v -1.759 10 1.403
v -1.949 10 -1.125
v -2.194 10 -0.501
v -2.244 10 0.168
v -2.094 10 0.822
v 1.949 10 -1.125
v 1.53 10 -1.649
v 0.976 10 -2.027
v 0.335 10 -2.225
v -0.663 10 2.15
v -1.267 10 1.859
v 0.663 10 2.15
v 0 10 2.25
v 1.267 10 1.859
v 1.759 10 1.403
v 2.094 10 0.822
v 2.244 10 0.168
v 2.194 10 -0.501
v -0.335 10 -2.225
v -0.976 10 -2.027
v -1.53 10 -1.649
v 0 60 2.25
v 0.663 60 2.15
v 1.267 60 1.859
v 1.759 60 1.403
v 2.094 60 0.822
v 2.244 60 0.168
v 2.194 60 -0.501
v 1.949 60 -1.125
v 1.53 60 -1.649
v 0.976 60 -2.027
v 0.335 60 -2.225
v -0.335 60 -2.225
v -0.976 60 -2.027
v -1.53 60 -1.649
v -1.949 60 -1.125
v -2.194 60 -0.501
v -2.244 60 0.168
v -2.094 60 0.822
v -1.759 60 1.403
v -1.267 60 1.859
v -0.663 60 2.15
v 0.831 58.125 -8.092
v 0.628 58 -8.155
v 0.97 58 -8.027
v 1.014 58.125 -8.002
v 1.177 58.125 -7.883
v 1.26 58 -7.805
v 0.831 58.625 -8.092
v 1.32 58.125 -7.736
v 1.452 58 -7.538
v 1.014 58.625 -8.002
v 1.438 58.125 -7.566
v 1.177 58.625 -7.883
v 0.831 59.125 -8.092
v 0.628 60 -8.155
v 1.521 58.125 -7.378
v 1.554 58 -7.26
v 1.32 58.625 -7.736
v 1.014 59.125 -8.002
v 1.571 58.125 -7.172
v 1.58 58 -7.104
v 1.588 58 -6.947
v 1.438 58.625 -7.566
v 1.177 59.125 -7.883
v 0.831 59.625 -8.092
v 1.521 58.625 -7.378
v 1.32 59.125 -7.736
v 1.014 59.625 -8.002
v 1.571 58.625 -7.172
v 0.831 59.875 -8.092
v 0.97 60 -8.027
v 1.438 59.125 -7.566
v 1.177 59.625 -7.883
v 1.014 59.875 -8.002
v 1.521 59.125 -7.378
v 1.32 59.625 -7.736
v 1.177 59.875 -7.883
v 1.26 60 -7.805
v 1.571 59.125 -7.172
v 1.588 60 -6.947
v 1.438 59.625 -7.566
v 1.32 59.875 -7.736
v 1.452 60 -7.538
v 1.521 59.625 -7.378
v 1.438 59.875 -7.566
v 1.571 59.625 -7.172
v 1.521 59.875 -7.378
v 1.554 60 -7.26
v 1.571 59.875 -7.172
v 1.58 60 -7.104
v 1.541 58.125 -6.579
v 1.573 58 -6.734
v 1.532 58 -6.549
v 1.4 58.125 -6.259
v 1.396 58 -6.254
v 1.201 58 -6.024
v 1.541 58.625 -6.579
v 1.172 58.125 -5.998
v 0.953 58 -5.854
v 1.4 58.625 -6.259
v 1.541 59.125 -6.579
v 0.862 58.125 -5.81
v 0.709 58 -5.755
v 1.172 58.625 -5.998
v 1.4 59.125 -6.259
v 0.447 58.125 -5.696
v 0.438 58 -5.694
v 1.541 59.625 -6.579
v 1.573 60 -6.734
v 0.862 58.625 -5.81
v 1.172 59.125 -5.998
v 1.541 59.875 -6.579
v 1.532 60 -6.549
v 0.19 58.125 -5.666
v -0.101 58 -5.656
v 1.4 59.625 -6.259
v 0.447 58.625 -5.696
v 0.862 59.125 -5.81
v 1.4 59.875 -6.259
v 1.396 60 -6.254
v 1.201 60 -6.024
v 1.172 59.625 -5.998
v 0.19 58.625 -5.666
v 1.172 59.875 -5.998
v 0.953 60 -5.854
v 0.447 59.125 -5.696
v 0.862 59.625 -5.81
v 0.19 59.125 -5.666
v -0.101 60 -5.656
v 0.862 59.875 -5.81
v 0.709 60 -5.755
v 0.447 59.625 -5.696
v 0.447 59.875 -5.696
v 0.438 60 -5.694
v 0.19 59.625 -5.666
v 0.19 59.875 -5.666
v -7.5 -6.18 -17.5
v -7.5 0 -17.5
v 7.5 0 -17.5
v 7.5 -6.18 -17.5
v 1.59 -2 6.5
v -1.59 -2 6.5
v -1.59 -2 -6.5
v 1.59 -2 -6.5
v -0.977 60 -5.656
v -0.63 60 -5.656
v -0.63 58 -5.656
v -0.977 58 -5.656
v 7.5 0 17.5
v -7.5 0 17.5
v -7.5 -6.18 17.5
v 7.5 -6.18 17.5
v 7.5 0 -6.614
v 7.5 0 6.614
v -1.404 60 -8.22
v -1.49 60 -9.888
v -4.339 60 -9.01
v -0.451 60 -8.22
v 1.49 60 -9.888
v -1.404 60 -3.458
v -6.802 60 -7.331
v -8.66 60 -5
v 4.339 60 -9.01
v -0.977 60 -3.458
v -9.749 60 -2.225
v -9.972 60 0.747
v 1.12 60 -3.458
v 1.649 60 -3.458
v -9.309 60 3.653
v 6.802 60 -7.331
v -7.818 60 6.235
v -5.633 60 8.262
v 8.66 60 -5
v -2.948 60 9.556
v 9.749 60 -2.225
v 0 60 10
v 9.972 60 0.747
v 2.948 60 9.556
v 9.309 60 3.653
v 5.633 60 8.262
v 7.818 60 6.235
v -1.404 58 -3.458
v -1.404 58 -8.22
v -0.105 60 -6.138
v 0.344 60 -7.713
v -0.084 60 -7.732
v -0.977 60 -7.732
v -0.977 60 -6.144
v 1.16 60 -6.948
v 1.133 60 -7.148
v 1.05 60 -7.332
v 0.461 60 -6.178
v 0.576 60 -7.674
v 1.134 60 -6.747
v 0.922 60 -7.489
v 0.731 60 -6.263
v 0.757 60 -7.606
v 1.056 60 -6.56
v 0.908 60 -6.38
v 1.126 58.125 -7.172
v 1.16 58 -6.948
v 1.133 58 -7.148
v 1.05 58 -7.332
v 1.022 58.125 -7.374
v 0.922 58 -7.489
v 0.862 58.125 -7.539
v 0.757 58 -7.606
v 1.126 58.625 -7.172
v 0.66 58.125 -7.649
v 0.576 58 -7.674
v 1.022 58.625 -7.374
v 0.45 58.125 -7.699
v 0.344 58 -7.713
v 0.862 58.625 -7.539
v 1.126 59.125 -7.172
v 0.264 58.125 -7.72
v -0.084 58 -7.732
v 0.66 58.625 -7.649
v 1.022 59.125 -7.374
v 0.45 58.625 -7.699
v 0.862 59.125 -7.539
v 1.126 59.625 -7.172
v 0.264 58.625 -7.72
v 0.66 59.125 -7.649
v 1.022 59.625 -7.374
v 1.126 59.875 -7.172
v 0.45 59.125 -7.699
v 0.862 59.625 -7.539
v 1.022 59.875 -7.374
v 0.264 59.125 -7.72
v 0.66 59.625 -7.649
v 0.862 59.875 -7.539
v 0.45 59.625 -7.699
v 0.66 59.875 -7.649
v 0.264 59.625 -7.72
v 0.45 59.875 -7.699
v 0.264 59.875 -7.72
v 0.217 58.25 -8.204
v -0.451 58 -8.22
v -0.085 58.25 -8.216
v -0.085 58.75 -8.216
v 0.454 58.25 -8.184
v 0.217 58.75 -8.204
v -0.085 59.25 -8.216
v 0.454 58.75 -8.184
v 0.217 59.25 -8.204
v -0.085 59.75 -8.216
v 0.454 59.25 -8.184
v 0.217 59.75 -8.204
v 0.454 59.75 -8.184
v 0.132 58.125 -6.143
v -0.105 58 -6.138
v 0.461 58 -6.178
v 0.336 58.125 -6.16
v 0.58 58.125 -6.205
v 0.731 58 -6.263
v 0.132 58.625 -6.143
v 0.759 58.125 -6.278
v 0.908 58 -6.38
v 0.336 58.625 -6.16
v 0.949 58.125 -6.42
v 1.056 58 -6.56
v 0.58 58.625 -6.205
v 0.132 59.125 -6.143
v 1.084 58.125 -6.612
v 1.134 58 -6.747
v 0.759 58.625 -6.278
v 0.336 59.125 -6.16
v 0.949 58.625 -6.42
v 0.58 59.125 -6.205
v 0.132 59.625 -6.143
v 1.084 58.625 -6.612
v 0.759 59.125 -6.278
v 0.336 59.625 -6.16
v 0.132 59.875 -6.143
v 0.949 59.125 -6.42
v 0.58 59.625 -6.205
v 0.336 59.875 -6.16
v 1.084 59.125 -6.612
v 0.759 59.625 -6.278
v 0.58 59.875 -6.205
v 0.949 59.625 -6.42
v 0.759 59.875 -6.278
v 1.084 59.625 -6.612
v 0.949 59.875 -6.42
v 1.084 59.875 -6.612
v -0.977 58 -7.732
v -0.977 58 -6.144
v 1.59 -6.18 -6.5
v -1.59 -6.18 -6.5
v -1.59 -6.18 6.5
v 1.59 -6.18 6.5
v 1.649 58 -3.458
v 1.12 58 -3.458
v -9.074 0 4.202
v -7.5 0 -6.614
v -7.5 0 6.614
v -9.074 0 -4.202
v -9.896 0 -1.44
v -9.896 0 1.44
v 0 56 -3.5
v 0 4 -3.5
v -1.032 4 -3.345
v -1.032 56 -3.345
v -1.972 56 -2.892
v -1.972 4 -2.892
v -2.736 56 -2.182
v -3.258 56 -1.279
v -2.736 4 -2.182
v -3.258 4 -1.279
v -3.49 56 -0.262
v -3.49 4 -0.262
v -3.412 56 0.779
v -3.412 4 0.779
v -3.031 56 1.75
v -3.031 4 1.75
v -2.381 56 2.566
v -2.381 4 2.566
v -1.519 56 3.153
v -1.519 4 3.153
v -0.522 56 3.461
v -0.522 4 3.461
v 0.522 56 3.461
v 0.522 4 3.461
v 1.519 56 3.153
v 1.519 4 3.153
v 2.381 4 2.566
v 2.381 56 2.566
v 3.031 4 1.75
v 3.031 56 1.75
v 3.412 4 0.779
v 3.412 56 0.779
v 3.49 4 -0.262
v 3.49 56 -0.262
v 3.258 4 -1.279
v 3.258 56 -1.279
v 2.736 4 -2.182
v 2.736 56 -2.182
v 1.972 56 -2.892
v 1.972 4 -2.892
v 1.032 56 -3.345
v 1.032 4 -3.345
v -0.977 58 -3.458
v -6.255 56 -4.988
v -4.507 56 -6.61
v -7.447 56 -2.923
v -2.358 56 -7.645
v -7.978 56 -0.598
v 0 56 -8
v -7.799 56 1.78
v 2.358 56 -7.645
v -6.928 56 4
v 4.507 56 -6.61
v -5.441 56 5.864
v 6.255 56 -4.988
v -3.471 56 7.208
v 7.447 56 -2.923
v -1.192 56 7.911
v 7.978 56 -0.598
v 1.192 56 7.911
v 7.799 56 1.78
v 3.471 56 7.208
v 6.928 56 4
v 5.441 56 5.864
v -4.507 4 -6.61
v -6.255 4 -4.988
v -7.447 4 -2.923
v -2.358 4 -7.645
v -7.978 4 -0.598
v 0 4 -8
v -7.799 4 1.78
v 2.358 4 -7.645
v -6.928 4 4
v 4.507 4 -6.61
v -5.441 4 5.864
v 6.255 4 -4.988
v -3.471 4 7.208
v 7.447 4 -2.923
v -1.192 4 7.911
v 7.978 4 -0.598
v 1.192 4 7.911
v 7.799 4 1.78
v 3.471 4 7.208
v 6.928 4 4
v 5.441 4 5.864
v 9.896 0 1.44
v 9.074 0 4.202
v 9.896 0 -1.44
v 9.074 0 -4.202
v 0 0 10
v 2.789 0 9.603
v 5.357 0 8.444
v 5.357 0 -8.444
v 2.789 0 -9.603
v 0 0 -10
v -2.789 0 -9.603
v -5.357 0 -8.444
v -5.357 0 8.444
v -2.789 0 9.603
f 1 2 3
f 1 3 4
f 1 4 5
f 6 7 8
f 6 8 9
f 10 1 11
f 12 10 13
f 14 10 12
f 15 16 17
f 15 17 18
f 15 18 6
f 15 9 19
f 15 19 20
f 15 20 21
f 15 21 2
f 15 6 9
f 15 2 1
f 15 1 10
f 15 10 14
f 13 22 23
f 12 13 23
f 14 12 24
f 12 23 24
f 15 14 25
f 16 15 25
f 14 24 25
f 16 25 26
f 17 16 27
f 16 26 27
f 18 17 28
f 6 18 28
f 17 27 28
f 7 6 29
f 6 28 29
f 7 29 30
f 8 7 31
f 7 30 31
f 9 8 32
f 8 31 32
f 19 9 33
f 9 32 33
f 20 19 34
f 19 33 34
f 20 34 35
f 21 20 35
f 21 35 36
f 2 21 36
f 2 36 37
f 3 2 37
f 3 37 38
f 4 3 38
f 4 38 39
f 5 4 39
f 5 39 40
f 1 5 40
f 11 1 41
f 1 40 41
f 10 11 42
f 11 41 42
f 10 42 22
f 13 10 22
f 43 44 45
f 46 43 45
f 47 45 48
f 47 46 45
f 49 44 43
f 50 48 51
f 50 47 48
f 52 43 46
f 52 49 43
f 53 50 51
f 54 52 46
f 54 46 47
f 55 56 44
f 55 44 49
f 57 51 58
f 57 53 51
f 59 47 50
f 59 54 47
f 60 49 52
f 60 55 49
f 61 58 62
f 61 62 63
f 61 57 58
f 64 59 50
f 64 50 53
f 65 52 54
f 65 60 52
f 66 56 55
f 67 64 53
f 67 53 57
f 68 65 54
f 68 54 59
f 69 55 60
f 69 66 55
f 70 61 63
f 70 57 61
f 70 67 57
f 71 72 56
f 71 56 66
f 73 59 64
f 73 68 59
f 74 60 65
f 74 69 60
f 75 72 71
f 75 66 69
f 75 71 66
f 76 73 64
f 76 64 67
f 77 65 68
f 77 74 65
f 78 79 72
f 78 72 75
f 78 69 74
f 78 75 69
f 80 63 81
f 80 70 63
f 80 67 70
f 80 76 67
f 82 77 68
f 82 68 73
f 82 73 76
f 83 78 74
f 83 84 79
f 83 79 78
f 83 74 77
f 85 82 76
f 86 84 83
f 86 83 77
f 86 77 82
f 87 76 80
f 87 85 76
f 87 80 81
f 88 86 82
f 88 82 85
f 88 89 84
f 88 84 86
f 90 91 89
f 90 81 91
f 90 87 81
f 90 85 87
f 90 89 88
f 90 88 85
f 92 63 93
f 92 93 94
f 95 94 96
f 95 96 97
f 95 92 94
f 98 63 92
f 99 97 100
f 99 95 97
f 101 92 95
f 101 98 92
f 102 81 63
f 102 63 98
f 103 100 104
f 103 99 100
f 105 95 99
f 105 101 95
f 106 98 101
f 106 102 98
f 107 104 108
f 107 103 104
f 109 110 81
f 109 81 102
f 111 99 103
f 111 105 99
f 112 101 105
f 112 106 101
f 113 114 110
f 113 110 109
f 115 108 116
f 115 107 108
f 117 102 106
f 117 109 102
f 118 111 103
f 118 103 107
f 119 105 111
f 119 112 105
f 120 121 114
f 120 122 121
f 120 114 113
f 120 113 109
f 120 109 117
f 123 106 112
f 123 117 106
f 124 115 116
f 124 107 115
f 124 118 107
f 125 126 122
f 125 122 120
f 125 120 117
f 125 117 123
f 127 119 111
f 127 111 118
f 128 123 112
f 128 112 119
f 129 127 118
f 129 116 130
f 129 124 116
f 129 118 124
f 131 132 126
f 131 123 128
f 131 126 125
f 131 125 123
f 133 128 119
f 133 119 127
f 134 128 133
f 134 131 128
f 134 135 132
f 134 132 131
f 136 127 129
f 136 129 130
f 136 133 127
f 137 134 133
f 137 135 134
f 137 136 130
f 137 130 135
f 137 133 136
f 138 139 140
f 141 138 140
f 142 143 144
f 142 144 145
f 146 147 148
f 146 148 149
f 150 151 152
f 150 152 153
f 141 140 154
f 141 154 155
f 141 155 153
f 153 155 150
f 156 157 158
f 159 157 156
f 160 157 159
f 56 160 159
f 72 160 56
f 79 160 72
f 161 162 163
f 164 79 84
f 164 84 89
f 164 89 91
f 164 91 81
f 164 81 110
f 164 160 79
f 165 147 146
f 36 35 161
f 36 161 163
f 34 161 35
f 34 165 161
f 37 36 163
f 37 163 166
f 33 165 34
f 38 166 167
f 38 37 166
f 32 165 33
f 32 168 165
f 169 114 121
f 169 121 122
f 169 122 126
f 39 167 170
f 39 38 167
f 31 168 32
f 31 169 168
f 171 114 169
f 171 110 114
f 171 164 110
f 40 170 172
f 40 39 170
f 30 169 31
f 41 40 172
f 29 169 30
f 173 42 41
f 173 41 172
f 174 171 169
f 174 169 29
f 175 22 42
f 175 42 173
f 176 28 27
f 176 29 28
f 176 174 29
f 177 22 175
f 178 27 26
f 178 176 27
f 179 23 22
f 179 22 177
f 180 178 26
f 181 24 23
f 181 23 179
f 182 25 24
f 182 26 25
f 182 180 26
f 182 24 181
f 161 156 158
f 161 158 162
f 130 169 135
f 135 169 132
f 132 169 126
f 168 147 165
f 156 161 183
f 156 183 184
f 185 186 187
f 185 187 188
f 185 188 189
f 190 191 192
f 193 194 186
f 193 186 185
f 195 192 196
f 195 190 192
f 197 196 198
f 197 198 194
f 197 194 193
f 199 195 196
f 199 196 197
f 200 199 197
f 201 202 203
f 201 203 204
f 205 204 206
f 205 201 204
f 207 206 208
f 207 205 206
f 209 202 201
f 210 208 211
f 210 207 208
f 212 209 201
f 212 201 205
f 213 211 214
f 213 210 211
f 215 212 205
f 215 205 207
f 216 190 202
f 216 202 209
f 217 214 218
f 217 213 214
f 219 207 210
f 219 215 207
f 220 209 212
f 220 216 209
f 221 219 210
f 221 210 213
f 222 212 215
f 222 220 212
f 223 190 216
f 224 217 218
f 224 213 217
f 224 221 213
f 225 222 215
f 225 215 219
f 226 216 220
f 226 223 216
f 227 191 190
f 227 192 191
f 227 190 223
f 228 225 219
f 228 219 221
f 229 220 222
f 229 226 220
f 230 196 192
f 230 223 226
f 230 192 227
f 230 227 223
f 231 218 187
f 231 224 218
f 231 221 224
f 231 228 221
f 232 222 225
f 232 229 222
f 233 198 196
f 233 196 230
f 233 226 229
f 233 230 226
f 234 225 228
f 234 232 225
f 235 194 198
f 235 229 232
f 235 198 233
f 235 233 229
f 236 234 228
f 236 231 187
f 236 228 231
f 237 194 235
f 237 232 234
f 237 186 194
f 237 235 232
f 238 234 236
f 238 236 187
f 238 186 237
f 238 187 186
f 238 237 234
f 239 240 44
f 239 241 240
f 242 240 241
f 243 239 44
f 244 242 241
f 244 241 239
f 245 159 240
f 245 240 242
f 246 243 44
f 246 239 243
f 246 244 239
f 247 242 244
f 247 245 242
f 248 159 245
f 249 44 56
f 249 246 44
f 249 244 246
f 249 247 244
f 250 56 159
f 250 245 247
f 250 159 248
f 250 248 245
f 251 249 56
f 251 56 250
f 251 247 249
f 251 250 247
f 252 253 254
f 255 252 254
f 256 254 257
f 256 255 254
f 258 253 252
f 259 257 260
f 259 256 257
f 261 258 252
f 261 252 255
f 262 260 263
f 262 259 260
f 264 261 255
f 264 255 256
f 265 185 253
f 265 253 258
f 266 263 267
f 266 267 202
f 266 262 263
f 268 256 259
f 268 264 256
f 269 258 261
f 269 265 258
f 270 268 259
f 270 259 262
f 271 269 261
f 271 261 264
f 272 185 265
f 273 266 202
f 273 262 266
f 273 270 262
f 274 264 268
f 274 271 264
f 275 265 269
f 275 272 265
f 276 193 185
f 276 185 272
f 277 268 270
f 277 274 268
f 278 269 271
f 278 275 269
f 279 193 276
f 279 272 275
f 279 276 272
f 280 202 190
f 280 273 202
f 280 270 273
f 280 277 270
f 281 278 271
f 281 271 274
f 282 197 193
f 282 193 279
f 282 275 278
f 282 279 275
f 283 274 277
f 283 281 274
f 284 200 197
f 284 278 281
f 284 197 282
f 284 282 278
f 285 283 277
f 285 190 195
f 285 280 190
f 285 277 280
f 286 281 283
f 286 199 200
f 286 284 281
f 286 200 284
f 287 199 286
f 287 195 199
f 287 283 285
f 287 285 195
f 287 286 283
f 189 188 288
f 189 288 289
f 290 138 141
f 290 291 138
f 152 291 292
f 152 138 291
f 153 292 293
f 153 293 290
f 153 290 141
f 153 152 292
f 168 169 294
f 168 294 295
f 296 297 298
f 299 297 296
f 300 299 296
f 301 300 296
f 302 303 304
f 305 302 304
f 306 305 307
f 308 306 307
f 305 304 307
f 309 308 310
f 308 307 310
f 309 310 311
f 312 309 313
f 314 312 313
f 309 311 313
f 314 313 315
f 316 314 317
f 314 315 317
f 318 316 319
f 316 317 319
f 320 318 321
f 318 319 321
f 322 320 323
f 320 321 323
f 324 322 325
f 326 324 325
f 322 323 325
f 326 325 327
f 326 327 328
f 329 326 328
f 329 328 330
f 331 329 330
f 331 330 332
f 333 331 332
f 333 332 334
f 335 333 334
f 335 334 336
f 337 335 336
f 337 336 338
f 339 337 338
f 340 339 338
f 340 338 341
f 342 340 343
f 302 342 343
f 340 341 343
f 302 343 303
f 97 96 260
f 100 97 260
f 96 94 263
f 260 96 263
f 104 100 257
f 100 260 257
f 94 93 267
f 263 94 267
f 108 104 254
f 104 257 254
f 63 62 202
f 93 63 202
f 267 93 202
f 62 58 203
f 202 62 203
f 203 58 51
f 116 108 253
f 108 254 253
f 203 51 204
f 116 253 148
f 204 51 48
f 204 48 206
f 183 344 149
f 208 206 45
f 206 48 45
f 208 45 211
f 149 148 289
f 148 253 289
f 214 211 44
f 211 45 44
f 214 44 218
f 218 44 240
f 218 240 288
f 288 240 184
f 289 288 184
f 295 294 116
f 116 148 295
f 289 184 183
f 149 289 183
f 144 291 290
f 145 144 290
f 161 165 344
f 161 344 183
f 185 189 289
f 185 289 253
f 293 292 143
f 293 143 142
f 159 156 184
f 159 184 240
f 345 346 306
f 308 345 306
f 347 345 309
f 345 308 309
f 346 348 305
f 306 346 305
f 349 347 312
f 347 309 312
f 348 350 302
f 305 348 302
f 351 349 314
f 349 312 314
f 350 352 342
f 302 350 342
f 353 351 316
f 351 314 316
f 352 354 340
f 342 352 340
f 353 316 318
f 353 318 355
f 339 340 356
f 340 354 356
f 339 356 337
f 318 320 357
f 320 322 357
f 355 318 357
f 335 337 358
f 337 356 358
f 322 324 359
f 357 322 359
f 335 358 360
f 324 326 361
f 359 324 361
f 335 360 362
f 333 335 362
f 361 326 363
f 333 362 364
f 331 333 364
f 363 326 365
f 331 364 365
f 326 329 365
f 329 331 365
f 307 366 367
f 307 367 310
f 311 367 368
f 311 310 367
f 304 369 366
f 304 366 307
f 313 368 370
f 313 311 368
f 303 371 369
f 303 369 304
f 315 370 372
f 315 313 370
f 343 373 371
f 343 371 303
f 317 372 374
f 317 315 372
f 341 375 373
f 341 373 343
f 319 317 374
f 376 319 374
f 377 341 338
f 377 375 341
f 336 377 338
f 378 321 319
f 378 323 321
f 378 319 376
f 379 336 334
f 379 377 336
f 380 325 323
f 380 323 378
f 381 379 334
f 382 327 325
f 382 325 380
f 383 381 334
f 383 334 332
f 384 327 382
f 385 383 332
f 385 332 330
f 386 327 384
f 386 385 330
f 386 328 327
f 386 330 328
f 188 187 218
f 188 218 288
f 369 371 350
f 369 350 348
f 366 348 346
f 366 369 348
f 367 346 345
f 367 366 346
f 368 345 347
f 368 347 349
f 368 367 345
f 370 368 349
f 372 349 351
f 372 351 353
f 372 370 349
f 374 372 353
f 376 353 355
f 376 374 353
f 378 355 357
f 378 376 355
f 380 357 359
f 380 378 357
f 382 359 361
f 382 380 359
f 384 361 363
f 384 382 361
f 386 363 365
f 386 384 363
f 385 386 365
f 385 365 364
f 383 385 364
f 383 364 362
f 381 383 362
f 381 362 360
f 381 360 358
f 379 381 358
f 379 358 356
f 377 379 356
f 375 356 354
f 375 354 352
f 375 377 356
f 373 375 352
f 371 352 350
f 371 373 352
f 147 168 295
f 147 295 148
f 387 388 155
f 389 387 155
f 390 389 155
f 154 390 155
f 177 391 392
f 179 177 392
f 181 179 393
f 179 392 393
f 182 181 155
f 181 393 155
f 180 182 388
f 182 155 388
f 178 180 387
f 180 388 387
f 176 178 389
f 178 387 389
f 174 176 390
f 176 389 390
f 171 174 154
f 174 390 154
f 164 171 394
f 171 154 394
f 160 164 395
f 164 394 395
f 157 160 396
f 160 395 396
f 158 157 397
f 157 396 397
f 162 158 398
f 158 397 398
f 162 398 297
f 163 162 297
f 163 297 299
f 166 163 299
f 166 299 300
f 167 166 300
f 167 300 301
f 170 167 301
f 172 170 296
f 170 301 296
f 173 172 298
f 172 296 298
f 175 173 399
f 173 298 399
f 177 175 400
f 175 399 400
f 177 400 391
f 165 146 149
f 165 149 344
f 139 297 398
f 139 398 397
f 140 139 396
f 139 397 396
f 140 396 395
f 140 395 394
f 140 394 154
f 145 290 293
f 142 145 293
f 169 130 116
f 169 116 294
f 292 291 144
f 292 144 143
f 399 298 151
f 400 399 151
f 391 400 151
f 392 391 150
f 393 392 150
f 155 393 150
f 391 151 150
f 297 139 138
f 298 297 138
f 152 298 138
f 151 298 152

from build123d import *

# Parameters (mm, degrees)
SKETCH1_R           = 10
BOSS_EXTRUDE1_DEPTH = 4
SKETCH2_R           = 10
SKETCH2_R_2         = 8
SKETCH2_R_3         = 3.5
BOSS_EXTRUDE2_DEPTH = 52
SKETCH3_R           = 10
BOSS_EXTRUDE3_DEPTH = 4
CUT_EXTRUDE1_DEPTH  = 2
SKETCH5_R           = 2.25
CUT_EXTRUDE2_DEPTH  = 50
SKETCH6_W           = 15
SKETCH6_H           = 35
BOSS_EXTRUDE4_DEPTH = 6.18
SKETCH7_W           = 3.18
SKETCH7_H           = 13
CUT_EXTRUDE3_DEPTH  = 4.18


with BuildPart() as part:
    # Sketch1 → Boss-Extrude1 (new body)
    with BuildSketch(Plane(origin=(0, 0, 0), x_dir=(1, 0, 0), z_dir=(0, 1, 0))):
        with Locations(Location((0, 0, 0), (0, 0, 270))):
            Circle(SKETCH1_R)
    extrude(amount=BOSS_EXTRUDE1_DEPTH)

    # Sketch2 → Boss-Extrude2 (add)
    # profile 1 of 2: a face of its own
    with BuildSketch(Plane(origin=(0, 4, 0), x_dir=(1, 0, 0), z_dir=(0, 1, 0))):
        with Locations(Location((0, 0, 0), (0, 0, 270))):
            Circle(SKETCH2_R)
        with Locations(Location((0, 0, 0), (0, 0, 90))):
            Circle(SKETCH2_R_2, mode=Mode.SUBTRACT)
    # profile 2 of 2: a face of its own
    with BuildSketch(Plane(origin=(0, 4, 0), x_dir=(1, 0, 0), z_dir=(0, 1, 0))):
        with Locations(Location((0, 0, 0), (0, 0, 90))):
            Circle(SKETCH2_R_3)
    extrude(amount=BOSS_EXTRUDE2_DEPTH)

    # Sketch3 → Boss-Extrude3 (add)
    with BuildSketch(Plane(origin=(0, 56, 0), x_dir=(1, 0, 0), z_dir=(0, 1, 0))):
        with Locations(Location((0, 0, 0), (0, 0, 270))):
            Circle(SKETCH3_R)
    extrude(amount=BOSS_EXTRUDE3_DEPTH)

    # Sketch4 → Cut-Extrude1 (cut)
    with BuildSketch(Plane(origin=(0, 60, 0), x_dir=(1, 0, 0), z_dir=(0, 1, 0))):
        with BuildLine():
            Line((-1.404326923, 8.220249015), (-0.451254507, 8.220249015))
            add(Edge.make_bspline(
                [(-0.451254507, 8.220249015), (-0.387653186, 8.220037307), (-0.265531604, 8.219630804), (-0.090580118, 8.217364176), (0.068388182, 8.210867642), (0.211290178, 8.205277034), (0.338123247, 8.195082643), (0.449276311, 8.185339048), (0.544237428, 8.172584174), (0.601721961, 8.16073858), (0.627749399, 8.155375217)],
                knots=[0, 0, 0, 0, 1.410062039, 2.707475311, 3.878576406, 4.937260626, 5.877586885, 6.699081471, 7.410979367, 8, 8, 8, 8], degree=3))
            add(Edge.make_bspline(
                [(0.627749399, 8.155375217), (0.662592698, 8.146766297), (0.731535995, 8.129732108), (0.830800192, 8.093728152), (0.925389325, 8.052063591), (1.014910479, 8.003127243), (1.098915252, 7.946555846), (1.178269811, 7.883326008), (1.253334245, 7.813783703), (1.32107282, 7.73617558), (1.384943458, 7.654755186), (1.438812268, 7.56671186), (1.485248657, 7.474643853), (1.522219967, 7.377614831), (1.551989638, 7.276565777), (1.572980343, 7.170581378), (1.585568566, 7.06014448), (1.586850162, 6.984818183), (1.5875, 6.946623714)],
                knots=[0, 0, 0, 0, 1.027469482, 2.033020251, 3.019912614, 3.986113645, 4.951240523, 5.91722682, 6.890402269, 7.87763091, 8.8651537, 9.85103654, 10.82876324, 11.815024772, 12.821070561, 13.842952187, 14.906261191, 16, 16, 16, 16], degree=3))
            add(Edge.make_bspline(
                [(1.5875, 6.946623714), (1.585501113, 6.883166661), (1.581600768, 6.759345515), (1.545235537, 6.579648387), (1.485668201, 6.412022927), (1.40358544, 6.256680195), (1.299056082, 6.116648209), (1.17342842, 5.993652625), (1.02663237, 5.890728316), (0.889976765, 5.819355035), (0.769262086, 5.773644684), (0.669884614, 5.741482353), (0.56148062, 5.716633036), (0.445088747, 5.694371571), (0.32022463, 5.677564444), (0.187187541, 5.665254614), (0.045882599, 5.657561069), (-0.051189492, 5.656415341), (-0.101126803, 5.655825938)],
                knots=[0, 0, 0, 0, 1.260483769, 2.459530307, 3.627416485, 4.787058657, 5.939039949, 7.08810263, 8.267026773, 9.491475466, 10.141966685, 10.831826277, 11.566392101, 12.351337768, 13.187381173, 14.07005841, 15.007169909, 16, 16, 16, 16], degree=3))
            Line((-0.101126803, 5.655825938), (1.648557692, 3.457749015))
            Line((1.648557692, 3.457749015), (1.120027043, 3.457749015))
            Line((1.120027043, 3.457749015), (-0.629657452, 5.655825938))
            Line((-0.629657452, 5.655825938), (-0.976923077, 5.655825938))
            Line((-0.976923077, 5.655825938), (-0.976923077, 3.457749015))
            Line((-0.976923077, 3.457749015), (-1.404326923, 3.457749015))
            Line((-1.404326923, 3.457749015), (-1.404326923, 8.220249015))
        make_face()
        with BuildLine():
            Line((-0.976923077, 7.731787476), (-0.976923077, 6.144287476))
            Line((-0.976923077, 6.144287476), (-0.104942909, 6.137609291))
            add(Edge.make_bspline(
                [(-0.104942909, 6.137609291), (-0.064230284, 6.13759128), (0.014682377, 6.137556369), (0.128847211, 6.142990757), (0.235146363, 6.149172915), (0.333173243, 6.158628989), (0.422971644, 6.170815644), (0.504496681, 6.186059705), (0.577881434, 6.203819833), (0.663468374, 6.231308474), (0.759040225, 6.27485952), (0.862905533, 6.338221859), (0.951355143, 6.417917696), (1.026082663, 6.509049435), (1.08613021, 6.60924733), (1.128464827, 6.717310318), (1.15532865, 6.830510314), (1.158497136, 6.908313383), (1.160096154, 6.947577741)],
                knots=[0, 0, 0, 0, 1.146690395, 2.22261258, 3.21895312, 4.145990853, 4.996080663, 5.770904154, 6.481378293, 7.121626537, 8.300444488, 9.431385265, 10.535395872, 11.636531494, 12.74115979, 13.810798291, 14.895190096, 16, 16, 16, 16], degree=3))
            add(Edge.make_bspline(
                [(1.160096154, 6.947577741), (1.158460411, 6.985877186), (1.155218964, 7.061772711), (1.128754747, 7.172883074), (1.084001696, 7.277749174), (1.023691794, 7.37594442), (0.950214372, 7.46507901), (0.86405692, 7.541343172), (0.767575208, 7.60427548), (0.677399041, 7.644490547), (0.596798202, 7.66914649), (0.526817129, 7.686497181), (0.447744011, 7.700436976), (0.359194905, 7.711605802), (0.261547829, 7.721205566), (0.15430905, 7.727671379), (0.038190074, 7.731500244), (-0.042292, 7.731689504), (-0.083954327, 7.731787476)],
                knots=[0, 0, 0, 0, 1.101028733, 2.181837193, 3.264309656, 4.369019818, 5.486613113, 6.575447106, 7.666700264, 8.788928104, 9.402425223, 10.0903467, 10.862060571, 11.710948788, 12.657782767, 13.684531032, 14.801375019, 16, 16, 16, 16], degree=3))
            Line((-0.083954327, 7.731787476), (-0.976923077, 7.731787476))
        make_face(mode=Mode.SUBTRACT)
    extrude(amount=-CUT_EXTRUDE1_DEPTH, mode=Mode.SUBTRACT)

    # Sketch5 → Cut-Extrude2 (cut)
    with BuildSketch(Plane(origin=(0, 60, 0), x_dir=(1, 0, 0), z_dir=(0, 1, 0))):
        with Locations(Location((0, 0, 0), (0, 0, 270))):
            Circle(SKETCH5_R)
    extrude(amount=-CUT_EXTRUDE2_DEPTH, mode=Mode.SUBTRACT)

    # Sketch6 → Boss-Extrude4 (add)
    with BuildSketch(Plane.XZ):
        Rectangle(SKETCH6_W, SKETCH6_H)
    extrude(amount=BOSS_EXTRUDE4_DEPTH)

    # Sketch7 → Cut-Extrude3 (cut)
    with BuildSketch(Plane.XZ.offset(6.18)):
        Rectangle(SKETCH7_W, SKETCH7_H)
    extrude(amount=-CUT_EXTRUDE3_DEPTH, mode=Mode.SUBTRACT)


solid = part.part
